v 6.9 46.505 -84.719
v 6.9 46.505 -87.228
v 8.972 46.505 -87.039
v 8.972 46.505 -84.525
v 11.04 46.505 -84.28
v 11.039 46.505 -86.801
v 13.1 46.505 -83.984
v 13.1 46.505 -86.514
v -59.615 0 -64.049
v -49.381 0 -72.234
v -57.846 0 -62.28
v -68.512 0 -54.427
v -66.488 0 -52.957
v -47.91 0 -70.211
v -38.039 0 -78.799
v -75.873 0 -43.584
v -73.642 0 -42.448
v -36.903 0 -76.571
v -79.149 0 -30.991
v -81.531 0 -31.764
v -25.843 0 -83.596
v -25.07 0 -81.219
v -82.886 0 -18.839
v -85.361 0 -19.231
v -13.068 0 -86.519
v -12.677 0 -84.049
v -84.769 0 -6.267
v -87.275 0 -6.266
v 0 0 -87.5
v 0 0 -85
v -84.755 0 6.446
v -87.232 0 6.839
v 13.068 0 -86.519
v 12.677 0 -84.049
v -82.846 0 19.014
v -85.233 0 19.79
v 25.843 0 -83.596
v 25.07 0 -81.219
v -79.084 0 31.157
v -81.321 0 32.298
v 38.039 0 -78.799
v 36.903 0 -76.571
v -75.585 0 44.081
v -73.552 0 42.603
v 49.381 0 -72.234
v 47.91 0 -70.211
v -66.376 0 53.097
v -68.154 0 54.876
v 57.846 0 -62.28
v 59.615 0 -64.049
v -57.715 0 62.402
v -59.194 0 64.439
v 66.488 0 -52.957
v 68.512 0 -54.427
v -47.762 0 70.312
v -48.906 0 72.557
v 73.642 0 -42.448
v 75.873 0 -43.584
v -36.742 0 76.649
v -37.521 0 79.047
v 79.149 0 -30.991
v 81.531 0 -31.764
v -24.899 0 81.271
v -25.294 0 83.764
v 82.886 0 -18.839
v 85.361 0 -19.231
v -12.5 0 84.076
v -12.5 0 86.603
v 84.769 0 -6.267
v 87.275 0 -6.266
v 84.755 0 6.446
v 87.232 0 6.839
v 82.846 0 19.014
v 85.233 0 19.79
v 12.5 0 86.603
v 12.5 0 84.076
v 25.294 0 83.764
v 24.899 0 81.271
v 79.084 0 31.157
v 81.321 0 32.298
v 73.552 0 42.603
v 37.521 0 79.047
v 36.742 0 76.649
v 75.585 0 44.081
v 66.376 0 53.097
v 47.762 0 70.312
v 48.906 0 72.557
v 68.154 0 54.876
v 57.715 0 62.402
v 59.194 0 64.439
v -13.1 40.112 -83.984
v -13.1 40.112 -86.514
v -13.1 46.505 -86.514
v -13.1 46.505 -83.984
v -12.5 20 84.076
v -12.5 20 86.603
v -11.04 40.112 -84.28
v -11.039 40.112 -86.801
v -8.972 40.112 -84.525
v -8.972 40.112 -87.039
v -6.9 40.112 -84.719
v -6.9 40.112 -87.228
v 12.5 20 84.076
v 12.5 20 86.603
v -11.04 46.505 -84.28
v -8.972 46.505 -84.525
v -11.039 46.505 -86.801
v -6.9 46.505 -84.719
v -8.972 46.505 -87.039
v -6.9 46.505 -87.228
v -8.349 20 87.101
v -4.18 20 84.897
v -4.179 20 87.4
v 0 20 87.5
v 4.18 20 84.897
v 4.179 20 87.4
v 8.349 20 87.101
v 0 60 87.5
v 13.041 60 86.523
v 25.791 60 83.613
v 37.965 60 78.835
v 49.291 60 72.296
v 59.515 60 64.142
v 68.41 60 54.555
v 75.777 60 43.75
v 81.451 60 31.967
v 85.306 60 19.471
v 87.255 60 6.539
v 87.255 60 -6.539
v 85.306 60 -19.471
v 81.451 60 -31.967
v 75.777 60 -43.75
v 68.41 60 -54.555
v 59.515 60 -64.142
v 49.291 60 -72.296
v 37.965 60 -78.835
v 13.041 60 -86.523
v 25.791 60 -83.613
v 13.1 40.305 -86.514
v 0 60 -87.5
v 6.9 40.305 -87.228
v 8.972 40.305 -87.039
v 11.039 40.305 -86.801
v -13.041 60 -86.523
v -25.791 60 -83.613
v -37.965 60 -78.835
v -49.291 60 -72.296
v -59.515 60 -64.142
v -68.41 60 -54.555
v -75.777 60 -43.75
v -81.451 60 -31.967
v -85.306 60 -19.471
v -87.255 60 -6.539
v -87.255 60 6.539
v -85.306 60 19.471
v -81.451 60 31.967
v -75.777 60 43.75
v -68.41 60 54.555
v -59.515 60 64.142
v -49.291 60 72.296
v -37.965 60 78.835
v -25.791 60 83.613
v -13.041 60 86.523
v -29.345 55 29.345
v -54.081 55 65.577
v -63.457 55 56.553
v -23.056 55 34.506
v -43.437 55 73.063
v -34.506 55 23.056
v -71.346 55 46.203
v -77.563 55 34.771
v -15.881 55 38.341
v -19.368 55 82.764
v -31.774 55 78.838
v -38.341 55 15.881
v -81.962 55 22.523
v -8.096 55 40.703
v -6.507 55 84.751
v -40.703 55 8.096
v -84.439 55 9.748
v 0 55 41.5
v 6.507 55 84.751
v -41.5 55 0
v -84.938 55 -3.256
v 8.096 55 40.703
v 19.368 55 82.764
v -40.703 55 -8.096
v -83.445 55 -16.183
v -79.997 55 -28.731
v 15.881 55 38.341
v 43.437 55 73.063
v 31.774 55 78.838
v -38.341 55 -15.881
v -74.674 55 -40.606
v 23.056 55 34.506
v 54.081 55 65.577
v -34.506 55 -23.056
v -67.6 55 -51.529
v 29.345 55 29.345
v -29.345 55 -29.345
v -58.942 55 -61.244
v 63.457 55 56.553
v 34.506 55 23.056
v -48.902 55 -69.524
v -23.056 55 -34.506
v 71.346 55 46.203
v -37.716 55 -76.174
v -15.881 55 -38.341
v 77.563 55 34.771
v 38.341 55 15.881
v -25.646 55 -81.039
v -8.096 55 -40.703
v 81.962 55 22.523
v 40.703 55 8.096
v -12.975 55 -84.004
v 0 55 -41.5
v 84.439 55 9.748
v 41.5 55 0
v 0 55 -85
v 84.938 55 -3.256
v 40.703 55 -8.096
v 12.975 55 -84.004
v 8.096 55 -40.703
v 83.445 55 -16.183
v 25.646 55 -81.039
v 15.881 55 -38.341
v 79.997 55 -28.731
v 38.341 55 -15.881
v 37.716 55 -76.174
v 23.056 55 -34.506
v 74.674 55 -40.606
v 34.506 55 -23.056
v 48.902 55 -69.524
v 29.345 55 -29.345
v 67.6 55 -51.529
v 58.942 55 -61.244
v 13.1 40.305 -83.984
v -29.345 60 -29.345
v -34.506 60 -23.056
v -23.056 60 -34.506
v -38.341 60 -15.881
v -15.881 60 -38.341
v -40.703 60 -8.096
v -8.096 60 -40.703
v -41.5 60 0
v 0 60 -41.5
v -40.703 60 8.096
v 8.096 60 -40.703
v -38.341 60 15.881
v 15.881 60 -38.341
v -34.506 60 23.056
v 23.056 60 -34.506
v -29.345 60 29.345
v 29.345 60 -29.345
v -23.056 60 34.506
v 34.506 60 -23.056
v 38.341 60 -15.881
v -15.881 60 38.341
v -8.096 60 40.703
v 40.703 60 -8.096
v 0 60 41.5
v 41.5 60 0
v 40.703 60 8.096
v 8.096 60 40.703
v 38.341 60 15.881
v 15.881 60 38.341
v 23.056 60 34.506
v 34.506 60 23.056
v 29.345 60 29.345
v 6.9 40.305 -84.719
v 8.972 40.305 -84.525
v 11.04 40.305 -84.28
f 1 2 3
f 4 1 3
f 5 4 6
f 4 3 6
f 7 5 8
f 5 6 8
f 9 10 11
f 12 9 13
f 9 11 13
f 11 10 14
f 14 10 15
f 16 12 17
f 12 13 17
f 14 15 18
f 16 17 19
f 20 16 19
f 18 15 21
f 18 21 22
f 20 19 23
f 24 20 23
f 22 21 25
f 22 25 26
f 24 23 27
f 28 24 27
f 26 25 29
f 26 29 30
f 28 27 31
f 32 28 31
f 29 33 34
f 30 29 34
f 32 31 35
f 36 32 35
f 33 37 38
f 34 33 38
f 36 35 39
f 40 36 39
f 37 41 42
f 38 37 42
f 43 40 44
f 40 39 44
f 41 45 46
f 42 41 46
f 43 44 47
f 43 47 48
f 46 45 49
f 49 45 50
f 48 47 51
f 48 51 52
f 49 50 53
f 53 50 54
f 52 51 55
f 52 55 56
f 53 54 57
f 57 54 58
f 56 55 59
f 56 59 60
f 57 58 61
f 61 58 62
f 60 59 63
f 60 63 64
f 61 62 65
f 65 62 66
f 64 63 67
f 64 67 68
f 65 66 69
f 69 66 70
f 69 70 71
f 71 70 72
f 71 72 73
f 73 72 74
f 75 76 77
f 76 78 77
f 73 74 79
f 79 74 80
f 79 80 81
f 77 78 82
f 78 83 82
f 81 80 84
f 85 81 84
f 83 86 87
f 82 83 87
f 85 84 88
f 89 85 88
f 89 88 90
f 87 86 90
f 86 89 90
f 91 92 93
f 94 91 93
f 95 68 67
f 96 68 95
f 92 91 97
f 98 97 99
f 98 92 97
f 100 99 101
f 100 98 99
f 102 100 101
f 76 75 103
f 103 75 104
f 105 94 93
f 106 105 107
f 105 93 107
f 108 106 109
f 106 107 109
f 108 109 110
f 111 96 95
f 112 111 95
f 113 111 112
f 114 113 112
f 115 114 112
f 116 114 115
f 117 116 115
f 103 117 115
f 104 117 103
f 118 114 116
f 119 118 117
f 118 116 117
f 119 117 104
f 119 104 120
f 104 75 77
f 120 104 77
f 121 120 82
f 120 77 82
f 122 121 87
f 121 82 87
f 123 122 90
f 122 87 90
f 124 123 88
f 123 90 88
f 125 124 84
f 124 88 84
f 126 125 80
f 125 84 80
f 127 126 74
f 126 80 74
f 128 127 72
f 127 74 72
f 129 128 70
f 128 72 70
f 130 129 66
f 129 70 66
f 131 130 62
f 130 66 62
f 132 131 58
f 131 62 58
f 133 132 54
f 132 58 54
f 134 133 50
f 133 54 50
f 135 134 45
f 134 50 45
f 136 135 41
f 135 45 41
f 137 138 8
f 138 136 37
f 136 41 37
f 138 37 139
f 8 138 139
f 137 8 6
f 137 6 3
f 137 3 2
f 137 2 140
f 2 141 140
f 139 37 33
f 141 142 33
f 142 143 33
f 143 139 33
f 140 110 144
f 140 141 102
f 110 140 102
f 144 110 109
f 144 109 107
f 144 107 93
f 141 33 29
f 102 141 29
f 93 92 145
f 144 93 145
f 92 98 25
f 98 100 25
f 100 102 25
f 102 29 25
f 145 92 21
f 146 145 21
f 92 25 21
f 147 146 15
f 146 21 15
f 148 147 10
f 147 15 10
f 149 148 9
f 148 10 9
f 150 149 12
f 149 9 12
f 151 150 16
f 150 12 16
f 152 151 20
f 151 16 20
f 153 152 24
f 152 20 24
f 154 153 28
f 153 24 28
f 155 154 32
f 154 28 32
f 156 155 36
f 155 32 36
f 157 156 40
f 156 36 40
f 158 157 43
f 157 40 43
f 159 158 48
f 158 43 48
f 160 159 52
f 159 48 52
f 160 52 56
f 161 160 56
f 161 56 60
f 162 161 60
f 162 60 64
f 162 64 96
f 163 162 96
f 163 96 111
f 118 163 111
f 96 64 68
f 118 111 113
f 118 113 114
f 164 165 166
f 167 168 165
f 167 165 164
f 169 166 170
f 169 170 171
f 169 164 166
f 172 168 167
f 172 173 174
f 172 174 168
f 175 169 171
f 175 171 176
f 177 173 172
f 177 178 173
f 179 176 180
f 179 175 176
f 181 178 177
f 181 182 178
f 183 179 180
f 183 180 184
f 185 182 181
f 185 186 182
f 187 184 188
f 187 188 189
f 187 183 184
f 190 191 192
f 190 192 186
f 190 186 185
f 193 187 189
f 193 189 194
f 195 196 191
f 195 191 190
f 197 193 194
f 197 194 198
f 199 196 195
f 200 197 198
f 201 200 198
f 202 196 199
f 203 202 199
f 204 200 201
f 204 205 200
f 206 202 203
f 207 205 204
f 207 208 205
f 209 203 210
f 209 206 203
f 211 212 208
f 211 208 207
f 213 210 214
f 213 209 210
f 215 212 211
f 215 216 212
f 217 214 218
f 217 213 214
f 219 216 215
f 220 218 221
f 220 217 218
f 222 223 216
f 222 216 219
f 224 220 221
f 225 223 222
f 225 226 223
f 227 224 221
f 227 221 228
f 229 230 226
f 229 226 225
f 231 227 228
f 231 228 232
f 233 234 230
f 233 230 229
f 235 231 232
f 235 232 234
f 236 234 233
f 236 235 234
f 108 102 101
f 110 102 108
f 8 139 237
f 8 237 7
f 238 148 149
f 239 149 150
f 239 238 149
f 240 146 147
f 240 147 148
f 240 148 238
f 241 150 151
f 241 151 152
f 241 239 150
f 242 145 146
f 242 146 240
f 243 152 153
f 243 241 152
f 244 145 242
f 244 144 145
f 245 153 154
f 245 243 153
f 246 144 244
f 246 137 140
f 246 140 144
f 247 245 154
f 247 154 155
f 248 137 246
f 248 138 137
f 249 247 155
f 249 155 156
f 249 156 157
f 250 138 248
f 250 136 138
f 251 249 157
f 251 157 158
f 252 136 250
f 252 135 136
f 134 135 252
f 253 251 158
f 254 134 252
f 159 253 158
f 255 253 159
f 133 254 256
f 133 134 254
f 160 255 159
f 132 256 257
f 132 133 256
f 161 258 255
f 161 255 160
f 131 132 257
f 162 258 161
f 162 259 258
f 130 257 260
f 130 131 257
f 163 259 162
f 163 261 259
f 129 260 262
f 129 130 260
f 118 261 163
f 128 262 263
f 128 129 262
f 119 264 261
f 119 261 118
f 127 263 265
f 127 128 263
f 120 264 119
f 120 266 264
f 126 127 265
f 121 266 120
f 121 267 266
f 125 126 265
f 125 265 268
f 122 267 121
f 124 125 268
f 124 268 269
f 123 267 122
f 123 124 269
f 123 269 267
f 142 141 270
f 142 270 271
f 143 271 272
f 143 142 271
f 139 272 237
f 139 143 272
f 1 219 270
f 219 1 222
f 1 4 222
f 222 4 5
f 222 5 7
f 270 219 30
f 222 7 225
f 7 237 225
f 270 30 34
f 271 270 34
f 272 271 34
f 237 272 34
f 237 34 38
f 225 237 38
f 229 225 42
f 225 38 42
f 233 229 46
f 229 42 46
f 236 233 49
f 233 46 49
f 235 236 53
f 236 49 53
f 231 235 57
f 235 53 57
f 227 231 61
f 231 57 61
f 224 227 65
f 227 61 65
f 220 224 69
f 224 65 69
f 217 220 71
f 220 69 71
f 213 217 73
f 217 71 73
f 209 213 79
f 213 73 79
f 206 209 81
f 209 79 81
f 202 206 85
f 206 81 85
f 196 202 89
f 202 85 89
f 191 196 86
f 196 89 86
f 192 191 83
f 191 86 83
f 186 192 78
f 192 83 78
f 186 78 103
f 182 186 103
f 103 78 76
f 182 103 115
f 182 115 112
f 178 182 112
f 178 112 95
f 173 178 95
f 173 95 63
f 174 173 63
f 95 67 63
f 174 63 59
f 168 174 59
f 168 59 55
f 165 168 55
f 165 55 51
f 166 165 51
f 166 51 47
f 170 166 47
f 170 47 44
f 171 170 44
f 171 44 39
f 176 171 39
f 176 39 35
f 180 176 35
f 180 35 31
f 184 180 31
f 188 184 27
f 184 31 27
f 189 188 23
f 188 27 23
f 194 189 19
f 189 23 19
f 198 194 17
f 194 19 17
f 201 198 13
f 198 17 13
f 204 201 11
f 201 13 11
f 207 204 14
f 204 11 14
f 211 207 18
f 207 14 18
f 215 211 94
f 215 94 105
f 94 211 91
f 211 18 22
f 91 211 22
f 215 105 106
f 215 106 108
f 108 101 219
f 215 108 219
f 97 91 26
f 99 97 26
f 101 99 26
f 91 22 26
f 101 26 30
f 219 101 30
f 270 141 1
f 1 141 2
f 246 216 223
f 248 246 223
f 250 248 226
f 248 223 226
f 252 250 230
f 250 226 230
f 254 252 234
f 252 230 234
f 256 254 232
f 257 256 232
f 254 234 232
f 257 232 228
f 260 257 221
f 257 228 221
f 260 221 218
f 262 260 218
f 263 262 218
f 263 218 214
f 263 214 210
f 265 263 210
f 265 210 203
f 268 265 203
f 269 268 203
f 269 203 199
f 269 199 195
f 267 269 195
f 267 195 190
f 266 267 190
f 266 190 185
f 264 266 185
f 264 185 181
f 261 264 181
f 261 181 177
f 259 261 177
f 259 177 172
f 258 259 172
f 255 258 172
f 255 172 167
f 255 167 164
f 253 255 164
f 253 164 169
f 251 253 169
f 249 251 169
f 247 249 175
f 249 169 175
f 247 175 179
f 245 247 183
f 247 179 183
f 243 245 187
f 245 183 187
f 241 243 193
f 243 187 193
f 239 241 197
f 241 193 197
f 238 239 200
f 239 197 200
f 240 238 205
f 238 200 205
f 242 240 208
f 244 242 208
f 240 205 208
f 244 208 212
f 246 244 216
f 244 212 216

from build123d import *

# Parameters (mm, degrees)
SKETCH1_R               = 87.5
BOSS_EXTRUDE1_DEPTH     = 60
SKETCH2_R               = 85
CUT_EXTRUDE1_DEPTH      = 55
CUT_EXTRUDE2_REACH      = 137.416
SKETCH3_R               = 41.5
CUT_EXTRUDE3_REACH      = 206.649
CUT_EXTRUDE3_END_RADIUS = 85
SKETCH4_W               = 25
SKETCH4_H               = 20
CUT_EXTRUDE5_REACH      = 206.649
CUT_EXTRUDE5_END_RADIUS = 85
SKETCH5_W               = 6.2
SKETCH5_H               = 6.2
SKETCH5_H_2             = 6.393620859


with BuildPart() as part:
    # Sketch1 → Boss-Extrude1 (new body)
    with BuildSketch(Plane(origin=(0, 0, 0), x_dir=(1, 0, 0), z_dir=(0, 1, 0))):
        with Locations(Location((0, 0, 0), (0, 0, 270))):
            Circle(SKETCH1_R)
    extrude(amount=BOSS_EXTRUDE1_DEPTH)

    # Sketch2 → Cut-Extrude1 (cut)
    with BuildSketch(Plane.XZ):
        with Locations(Location((0, 0, 0), (0, 0, 270))):
            Circle(SKETCH2_R)
    extrude(amount=-CUT_EXTRUDE1_DEPTH, mode=Mode.SUBTRACT)

    # Sketch3 → Cut-Extrude2 (cut, up to next)
    with BuildSketch(Plane.XZ.offset(-55), mode=Mode.PRIVATE) as cut_extrude2_sk1:
        with Locations(Location((0, 0, 0), (0, 0, 270))):
            Circle(SKETCH3_R)
    cut_extrude2_tool1 = extrude(cut_extrude2_sk1.sketch, amount=-CUT_EXTRUDE2_REACH, mode=Mode.PRIVATE) & part.part
    add(cut_extrude2_tool1.solids().sort_by_distance((0, 55, 0))[0], mode=Mode.SUBTRACT)

    # Cut-Extrude3: up to this cylinder (the profile starts outside it)
    cut_extrude3_end = Plane(origin=(0, 10, 0), z_dir=(0, -1, 0)) * Cylinder(CUT_EXTRUDE3_END_RADIUS, 584.298, mode=Mode.PRIVATE)
    # Sketch4 → Cut-Extrude3 (cut, up to the surface)
    with BuildSketch(Plane.XY.offset(87.5), mode=Mode.PRIVATE) as cut_extrude3_sk1:
        with Locations((0, 10)):
            Rectangle(SKETCH4_W, SKETCH4_H)
    cut_extrude3_tool1 = extrude(cut_extrude3_sk1.sketch, amount=-CUT_EXTRUDE3_REACH, mode=Mode.PRIVATE) - cut_extrude3_end
    add(cut_extrude3_tool1.solids().sort_by_distance((0, 10, 87.5))[0], mode=Mode.SUBTRACT)

    # Cut-Extrude5: up to this cylinder (the profile starts outside it)
    cut_extrude5_end = Plane(origin=(0, 43.356907, 0), z_dir=(0, -1, 0)) * Cylinder(CUT_EXTRUDE5_END_RADIUS, 584.39481, mode=Mode.PRIVATE)
    # Sketch5 → Cut-Extrude5 (cut, up to the surface)
    with BuildSketch(Plane.XY.offset(-87.5), mode=Mode.PRIVATE) as cut_extrude5_sk1:
        with Locations((10, 43.405312256)):
            Rectangle(SKETCH5_W, SKETCH5_H)
    cut_extrude5_tool1 = extrude(cut_extrude5_sk1.sketch, amount=CUT_EXTRUDE5_REACH, mode=Mode.PRIVATE) - cut_extrude5_end
    add(cut_extrude5_tool1.solids().sort_by_distance((10, 43.405312, -87.5))[0], mode=Mode.SUBTRACT)
    # Sketch5 → Cut-Extrude5 (cut, up to the surface)
    with BuildSketch(Plane.XY.offset(-87.5), mode=Mode.PRIVATE) as cut_extrude5_sk2:
        with Locations((-10, 43.308501827)):
            Rectangle(SKETCH5_W, SKETCH5_H_2)
    cut_extrude5_tool2 = extrude(cut_extrude5_sk2.sketch, amount=CUT_EXTRUDE5_REACH, mode=Mode.PRIVATE) - cut_extrude5_end
    add(cut_extrude5_tool2.solids().sort_by_distance((-10, 43.308502, -87.5))[0], mode=Mode.SUBTRACT)


solid = part.part
